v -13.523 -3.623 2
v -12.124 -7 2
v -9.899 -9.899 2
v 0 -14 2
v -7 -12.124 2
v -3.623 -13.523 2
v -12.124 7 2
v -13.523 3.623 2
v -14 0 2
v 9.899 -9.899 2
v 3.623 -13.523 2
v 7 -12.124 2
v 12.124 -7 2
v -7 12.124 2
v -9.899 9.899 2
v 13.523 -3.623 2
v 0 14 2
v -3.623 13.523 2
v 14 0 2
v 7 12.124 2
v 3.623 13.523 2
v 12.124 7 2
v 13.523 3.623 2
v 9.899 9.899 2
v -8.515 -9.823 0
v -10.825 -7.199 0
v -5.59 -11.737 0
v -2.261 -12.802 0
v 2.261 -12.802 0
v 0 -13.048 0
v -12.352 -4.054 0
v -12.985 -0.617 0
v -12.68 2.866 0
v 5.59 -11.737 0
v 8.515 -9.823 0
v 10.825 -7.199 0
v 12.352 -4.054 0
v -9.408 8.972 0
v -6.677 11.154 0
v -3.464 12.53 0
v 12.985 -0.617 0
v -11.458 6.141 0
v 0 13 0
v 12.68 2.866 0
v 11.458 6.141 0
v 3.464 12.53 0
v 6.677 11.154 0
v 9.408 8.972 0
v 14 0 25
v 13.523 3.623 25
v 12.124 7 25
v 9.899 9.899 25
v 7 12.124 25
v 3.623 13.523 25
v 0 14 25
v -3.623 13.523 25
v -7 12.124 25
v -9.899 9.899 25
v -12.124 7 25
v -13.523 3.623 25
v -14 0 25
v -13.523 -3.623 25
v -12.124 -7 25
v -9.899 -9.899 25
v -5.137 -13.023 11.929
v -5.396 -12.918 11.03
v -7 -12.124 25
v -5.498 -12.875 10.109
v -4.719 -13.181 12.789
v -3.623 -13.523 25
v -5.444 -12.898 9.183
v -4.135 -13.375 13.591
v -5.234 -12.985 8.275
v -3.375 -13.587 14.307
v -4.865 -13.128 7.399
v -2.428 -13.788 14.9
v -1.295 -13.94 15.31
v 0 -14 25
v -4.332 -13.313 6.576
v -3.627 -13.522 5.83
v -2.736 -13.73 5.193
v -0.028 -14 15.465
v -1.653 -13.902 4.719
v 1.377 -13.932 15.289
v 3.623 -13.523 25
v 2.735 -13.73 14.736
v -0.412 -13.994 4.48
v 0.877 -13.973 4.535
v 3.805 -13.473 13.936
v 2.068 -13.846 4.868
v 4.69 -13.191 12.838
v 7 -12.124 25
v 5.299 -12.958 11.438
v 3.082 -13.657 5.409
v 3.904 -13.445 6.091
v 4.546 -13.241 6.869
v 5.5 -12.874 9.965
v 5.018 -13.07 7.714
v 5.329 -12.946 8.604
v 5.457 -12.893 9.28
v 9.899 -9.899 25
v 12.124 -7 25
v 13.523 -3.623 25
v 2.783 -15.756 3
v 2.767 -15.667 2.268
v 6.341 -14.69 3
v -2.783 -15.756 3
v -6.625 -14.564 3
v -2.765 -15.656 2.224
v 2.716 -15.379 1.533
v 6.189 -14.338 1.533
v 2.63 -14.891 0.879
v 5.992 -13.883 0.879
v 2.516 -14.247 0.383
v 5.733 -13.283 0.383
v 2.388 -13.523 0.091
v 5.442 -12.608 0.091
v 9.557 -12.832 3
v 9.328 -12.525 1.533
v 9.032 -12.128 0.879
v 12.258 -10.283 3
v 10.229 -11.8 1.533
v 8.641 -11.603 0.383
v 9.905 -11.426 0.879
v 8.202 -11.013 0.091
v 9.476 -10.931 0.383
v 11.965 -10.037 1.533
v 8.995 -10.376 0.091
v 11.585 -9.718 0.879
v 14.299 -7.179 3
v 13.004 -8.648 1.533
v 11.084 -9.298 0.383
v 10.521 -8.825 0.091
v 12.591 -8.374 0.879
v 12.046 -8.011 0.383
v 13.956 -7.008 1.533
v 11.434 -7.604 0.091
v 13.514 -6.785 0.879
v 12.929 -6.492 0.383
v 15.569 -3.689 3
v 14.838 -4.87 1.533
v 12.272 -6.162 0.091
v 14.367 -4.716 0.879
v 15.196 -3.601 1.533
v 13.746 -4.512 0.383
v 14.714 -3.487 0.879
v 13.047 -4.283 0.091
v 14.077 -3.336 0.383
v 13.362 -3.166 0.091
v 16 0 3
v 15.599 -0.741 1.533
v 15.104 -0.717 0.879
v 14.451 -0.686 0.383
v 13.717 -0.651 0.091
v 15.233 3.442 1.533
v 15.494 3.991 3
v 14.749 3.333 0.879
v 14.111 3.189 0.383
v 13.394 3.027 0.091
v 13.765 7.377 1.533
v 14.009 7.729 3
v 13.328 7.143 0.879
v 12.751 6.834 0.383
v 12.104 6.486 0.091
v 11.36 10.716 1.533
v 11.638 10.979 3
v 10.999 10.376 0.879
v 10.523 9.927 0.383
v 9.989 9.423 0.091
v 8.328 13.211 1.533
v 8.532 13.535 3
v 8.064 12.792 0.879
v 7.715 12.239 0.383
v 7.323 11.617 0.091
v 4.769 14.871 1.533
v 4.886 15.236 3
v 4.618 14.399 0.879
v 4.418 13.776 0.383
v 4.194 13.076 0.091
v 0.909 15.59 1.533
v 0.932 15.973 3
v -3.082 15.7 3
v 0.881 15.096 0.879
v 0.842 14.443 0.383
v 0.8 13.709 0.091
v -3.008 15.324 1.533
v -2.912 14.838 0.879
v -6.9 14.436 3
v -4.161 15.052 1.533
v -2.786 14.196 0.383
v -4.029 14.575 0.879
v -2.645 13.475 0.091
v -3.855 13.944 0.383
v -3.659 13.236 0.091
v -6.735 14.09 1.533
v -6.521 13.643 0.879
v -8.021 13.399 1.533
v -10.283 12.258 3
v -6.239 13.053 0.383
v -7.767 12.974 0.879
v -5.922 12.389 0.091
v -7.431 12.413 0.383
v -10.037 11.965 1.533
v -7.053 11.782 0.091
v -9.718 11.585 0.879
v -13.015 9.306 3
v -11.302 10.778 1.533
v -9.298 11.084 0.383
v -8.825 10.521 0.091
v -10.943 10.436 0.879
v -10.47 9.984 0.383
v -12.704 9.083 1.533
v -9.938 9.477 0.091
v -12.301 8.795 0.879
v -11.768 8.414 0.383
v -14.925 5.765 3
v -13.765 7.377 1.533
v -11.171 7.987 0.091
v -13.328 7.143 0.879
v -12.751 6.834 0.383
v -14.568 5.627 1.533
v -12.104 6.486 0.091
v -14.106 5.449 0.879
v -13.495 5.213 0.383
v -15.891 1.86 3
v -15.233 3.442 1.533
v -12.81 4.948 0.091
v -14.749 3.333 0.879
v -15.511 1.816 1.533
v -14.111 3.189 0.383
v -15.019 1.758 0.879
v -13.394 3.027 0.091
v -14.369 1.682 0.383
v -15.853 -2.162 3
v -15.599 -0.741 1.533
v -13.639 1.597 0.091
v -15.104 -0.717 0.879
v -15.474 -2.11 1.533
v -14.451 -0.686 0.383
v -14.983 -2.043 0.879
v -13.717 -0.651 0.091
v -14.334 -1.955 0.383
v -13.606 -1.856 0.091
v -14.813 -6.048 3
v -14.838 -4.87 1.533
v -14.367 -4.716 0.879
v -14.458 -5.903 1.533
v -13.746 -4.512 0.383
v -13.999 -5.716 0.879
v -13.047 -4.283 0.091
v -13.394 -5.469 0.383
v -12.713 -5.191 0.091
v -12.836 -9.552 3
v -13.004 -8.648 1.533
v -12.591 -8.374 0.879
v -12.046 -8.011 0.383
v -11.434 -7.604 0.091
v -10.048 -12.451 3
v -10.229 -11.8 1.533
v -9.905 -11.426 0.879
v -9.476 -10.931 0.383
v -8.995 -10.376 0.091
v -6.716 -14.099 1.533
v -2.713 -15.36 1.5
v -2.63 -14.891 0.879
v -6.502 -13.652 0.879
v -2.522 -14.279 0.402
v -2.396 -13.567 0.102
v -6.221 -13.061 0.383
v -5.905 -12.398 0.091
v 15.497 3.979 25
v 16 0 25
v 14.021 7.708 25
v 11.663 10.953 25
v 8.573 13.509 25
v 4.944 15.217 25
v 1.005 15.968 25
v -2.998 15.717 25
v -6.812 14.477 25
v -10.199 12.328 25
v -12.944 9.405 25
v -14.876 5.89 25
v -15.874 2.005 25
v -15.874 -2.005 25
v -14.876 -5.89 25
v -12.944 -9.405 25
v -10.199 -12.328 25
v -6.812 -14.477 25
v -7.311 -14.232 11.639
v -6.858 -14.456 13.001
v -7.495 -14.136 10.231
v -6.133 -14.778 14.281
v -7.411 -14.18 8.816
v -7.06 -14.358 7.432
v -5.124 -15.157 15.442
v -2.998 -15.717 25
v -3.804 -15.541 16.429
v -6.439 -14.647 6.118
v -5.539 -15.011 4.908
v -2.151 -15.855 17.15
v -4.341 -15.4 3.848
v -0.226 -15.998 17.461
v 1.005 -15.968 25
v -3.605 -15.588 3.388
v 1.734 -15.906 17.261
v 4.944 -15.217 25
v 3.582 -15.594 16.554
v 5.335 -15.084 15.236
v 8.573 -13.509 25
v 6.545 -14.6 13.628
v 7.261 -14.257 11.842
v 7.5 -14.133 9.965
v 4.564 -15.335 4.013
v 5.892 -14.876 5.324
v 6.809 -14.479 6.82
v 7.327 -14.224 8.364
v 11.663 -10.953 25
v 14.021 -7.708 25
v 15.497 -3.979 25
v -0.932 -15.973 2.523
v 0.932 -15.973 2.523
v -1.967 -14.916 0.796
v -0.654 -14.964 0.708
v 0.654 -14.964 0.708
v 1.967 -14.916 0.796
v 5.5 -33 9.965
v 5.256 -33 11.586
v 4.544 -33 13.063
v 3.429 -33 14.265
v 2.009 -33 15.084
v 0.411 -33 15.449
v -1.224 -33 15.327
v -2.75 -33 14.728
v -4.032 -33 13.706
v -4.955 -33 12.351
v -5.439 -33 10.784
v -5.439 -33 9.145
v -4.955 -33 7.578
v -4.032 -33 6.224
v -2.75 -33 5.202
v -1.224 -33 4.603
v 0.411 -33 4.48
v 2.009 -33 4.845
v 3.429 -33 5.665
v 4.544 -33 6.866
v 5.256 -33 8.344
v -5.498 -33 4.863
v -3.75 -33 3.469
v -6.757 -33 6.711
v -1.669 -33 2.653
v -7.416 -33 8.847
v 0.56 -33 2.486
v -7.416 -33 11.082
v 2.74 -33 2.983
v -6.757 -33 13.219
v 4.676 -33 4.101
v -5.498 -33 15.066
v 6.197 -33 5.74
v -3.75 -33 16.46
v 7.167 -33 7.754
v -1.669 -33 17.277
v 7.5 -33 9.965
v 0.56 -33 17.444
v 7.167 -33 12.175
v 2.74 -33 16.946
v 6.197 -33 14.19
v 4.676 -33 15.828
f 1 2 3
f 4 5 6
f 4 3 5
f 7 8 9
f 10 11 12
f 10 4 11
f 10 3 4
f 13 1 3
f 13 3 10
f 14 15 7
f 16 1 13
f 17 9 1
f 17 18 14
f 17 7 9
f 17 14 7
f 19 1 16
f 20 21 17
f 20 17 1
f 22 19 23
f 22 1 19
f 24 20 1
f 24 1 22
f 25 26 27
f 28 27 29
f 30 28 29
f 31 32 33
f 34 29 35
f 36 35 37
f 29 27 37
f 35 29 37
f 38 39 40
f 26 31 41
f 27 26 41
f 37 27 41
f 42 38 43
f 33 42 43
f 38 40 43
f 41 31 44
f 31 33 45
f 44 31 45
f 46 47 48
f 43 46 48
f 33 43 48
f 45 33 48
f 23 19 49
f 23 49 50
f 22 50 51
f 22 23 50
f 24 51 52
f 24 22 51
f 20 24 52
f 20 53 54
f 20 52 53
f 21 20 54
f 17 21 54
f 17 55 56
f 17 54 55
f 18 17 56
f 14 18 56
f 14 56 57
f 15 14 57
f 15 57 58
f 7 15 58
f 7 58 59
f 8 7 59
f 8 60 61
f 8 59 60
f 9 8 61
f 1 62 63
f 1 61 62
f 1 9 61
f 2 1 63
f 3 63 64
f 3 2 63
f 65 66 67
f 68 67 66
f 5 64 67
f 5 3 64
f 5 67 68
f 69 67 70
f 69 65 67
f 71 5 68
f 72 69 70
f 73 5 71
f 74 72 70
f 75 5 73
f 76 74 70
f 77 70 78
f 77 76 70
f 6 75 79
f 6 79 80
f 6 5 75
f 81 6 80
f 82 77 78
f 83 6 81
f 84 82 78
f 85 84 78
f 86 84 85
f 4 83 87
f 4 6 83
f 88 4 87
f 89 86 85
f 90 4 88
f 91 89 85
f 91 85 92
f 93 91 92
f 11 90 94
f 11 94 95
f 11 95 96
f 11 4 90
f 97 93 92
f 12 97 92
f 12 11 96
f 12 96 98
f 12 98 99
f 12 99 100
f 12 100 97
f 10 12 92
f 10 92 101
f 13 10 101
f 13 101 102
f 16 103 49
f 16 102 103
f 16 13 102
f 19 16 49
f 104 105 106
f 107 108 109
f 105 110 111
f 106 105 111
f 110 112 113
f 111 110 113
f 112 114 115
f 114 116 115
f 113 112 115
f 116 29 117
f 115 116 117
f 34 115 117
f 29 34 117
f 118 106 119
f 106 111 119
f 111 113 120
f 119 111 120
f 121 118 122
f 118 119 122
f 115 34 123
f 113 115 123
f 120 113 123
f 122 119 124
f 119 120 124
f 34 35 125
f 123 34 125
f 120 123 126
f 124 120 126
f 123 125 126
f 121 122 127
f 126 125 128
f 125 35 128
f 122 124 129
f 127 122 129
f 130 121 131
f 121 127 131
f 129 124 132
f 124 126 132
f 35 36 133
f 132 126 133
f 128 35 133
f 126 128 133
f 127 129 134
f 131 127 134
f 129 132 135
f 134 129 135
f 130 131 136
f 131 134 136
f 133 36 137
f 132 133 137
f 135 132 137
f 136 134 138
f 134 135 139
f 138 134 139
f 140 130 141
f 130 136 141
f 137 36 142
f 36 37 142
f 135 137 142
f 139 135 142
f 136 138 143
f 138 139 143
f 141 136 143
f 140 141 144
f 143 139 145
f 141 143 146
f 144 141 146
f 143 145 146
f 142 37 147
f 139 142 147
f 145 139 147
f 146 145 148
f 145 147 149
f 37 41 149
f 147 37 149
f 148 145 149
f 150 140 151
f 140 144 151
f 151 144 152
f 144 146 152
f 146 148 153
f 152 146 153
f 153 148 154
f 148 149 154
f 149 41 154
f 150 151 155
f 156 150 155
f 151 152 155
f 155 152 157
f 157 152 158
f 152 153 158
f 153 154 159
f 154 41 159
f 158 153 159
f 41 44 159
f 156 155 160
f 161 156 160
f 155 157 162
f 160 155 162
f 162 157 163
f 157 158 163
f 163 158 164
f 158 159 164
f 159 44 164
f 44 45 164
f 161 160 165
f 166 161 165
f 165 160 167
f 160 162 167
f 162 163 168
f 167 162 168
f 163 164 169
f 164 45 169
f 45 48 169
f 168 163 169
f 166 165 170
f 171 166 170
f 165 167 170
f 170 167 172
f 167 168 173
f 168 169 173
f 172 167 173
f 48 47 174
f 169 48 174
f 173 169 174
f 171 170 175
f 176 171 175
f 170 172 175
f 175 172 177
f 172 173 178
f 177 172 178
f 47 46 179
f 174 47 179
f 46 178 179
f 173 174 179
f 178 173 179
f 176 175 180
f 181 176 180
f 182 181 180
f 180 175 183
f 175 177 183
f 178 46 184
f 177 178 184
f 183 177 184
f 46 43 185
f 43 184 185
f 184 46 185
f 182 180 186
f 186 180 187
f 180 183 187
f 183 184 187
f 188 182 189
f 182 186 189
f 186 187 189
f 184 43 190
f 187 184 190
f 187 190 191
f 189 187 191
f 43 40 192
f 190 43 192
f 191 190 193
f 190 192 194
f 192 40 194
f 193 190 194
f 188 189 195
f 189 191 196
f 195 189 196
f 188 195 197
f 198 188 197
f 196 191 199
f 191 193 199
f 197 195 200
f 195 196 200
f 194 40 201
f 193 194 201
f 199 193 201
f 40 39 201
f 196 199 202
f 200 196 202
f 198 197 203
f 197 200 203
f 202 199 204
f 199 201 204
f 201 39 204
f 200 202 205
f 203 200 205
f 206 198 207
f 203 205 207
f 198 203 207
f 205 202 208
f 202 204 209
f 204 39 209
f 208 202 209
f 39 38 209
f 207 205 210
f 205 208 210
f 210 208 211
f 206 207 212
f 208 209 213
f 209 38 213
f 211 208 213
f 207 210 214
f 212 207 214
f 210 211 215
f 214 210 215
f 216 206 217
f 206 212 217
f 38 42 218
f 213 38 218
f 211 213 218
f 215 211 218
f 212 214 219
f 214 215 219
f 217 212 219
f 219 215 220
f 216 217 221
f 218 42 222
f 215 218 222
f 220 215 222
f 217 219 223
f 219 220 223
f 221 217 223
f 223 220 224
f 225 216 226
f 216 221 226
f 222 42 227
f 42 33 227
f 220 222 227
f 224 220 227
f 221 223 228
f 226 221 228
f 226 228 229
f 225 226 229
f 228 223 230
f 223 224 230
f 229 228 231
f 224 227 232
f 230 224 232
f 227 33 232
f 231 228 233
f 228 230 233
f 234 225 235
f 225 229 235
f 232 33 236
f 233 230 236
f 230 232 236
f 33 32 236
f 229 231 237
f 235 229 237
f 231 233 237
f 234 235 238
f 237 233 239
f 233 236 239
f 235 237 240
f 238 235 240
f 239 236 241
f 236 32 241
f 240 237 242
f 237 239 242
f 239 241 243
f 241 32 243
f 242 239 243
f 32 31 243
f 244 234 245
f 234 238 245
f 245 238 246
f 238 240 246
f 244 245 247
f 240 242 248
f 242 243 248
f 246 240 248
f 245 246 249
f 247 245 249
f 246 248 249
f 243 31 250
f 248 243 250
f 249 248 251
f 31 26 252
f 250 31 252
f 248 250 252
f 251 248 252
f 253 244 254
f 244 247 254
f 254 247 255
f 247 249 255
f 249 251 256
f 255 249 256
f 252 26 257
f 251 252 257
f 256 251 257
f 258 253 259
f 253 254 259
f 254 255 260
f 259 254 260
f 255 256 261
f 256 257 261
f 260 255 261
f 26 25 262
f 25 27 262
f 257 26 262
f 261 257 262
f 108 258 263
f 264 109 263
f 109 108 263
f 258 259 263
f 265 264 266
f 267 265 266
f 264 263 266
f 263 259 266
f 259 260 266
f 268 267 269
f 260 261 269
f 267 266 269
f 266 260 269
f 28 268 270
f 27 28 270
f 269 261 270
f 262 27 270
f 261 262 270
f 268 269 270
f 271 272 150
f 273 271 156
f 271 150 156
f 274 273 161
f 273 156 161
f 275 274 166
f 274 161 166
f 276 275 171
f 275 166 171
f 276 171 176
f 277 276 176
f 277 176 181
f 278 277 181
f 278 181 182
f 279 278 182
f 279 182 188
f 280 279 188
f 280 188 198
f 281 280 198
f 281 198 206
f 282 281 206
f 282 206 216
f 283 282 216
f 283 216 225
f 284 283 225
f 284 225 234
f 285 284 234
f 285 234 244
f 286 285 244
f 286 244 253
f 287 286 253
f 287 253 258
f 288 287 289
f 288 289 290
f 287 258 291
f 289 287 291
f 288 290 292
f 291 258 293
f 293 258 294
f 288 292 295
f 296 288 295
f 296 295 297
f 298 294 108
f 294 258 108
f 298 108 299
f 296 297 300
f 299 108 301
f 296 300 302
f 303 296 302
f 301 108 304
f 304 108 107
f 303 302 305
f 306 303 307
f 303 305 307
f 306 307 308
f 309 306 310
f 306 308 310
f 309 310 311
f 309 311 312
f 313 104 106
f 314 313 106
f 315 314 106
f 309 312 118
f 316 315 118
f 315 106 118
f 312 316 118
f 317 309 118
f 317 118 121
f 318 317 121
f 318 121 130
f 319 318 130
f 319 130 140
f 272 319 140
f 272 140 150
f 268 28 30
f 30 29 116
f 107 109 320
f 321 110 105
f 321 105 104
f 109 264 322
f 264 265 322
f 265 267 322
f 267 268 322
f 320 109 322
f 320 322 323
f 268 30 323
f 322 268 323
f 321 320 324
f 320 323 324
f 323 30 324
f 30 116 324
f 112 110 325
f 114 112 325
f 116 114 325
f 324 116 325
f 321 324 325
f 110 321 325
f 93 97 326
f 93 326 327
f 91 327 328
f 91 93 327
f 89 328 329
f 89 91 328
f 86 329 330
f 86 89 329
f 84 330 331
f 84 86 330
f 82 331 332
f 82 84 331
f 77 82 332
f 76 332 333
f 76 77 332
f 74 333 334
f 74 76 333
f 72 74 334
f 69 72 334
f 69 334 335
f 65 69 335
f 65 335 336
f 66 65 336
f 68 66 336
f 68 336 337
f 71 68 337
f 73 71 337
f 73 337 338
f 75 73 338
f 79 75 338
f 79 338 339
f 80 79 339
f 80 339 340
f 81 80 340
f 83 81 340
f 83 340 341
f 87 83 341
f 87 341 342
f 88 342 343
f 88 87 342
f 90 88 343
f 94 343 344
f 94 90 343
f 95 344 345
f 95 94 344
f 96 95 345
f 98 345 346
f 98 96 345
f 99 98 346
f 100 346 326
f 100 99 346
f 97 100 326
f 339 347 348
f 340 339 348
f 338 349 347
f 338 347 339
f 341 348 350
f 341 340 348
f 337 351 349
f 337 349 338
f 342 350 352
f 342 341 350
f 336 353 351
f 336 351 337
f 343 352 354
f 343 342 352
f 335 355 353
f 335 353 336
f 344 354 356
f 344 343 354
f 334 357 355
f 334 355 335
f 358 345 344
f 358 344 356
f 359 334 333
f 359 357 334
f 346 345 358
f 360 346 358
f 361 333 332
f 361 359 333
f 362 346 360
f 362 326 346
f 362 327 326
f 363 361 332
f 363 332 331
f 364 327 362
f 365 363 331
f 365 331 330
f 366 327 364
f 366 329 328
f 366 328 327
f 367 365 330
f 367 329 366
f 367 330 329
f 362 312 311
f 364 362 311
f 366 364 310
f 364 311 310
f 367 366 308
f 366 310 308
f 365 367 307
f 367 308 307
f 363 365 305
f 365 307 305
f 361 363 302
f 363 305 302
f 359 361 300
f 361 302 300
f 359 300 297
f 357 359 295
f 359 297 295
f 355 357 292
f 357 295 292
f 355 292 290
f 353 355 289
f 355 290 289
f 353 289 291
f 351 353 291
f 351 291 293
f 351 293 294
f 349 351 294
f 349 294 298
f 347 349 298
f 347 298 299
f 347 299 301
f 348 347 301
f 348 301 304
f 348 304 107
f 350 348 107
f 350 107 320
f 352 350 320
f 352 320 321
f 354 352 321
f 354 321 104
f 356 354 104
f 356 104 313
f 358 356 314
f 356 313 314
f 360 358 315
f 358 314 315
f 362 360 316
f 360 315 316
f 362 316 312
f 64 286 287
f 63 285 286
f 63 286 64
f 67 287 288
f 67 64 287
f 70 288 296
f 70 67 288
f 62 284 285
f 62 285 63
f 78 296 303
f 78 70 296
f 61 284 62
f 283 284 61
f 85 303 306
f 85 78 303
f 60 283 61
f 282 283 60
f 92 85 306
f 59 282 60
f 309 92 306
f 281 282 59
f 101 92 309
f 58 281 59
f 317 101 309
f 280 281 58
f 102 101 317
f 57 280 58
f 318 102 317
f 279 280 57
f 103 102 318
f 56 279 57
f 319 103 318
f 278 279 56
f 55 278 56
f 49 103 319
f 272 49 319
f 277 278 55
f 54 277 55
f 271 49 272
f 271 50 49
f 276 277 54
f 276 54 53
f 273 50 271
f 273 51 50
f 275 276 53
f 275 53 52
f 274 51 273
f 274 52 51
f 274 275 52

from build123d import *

# Parameters (mm, degrees)
F0_R     = 16
F1_DEPTH = 25
F3_R     = 7.5
F4_DEPTH = 20
F5_T     = -2
F6_R     = 3


with BuildPart() as f1:
    # F0 (on Top) → F1 (new body)
    with BuildSketch(Plane.XY):
        Circle(F0_R)
    extrude(amount=F1_DEPTH)

    # F3 (on offset) → F4 (join)
    with BuildSketch(Plane.XZ.offset(13)):
        with Locations((0, 9.9646812305)):
            Circle(F3_R)
    extrude(amount=F4_DEPTH)

    # F5
    f5_openings = [f1.faces().sort_by_distance(p)[0] for p in [
        (0, 0, 25),
        (0, -33, 9.964681),
    ]]
    offset(amount=F5_T, openings=f5_openings, kind=Kind.INTERSECTION)

    # F6
    f6_edges = [f1.edges().sort_by_distance(p)[0] for p in [
        (-16, 0, 0),
    ]]
    fillet(f6_edges, radius=F6_R)


solid = f1.part
